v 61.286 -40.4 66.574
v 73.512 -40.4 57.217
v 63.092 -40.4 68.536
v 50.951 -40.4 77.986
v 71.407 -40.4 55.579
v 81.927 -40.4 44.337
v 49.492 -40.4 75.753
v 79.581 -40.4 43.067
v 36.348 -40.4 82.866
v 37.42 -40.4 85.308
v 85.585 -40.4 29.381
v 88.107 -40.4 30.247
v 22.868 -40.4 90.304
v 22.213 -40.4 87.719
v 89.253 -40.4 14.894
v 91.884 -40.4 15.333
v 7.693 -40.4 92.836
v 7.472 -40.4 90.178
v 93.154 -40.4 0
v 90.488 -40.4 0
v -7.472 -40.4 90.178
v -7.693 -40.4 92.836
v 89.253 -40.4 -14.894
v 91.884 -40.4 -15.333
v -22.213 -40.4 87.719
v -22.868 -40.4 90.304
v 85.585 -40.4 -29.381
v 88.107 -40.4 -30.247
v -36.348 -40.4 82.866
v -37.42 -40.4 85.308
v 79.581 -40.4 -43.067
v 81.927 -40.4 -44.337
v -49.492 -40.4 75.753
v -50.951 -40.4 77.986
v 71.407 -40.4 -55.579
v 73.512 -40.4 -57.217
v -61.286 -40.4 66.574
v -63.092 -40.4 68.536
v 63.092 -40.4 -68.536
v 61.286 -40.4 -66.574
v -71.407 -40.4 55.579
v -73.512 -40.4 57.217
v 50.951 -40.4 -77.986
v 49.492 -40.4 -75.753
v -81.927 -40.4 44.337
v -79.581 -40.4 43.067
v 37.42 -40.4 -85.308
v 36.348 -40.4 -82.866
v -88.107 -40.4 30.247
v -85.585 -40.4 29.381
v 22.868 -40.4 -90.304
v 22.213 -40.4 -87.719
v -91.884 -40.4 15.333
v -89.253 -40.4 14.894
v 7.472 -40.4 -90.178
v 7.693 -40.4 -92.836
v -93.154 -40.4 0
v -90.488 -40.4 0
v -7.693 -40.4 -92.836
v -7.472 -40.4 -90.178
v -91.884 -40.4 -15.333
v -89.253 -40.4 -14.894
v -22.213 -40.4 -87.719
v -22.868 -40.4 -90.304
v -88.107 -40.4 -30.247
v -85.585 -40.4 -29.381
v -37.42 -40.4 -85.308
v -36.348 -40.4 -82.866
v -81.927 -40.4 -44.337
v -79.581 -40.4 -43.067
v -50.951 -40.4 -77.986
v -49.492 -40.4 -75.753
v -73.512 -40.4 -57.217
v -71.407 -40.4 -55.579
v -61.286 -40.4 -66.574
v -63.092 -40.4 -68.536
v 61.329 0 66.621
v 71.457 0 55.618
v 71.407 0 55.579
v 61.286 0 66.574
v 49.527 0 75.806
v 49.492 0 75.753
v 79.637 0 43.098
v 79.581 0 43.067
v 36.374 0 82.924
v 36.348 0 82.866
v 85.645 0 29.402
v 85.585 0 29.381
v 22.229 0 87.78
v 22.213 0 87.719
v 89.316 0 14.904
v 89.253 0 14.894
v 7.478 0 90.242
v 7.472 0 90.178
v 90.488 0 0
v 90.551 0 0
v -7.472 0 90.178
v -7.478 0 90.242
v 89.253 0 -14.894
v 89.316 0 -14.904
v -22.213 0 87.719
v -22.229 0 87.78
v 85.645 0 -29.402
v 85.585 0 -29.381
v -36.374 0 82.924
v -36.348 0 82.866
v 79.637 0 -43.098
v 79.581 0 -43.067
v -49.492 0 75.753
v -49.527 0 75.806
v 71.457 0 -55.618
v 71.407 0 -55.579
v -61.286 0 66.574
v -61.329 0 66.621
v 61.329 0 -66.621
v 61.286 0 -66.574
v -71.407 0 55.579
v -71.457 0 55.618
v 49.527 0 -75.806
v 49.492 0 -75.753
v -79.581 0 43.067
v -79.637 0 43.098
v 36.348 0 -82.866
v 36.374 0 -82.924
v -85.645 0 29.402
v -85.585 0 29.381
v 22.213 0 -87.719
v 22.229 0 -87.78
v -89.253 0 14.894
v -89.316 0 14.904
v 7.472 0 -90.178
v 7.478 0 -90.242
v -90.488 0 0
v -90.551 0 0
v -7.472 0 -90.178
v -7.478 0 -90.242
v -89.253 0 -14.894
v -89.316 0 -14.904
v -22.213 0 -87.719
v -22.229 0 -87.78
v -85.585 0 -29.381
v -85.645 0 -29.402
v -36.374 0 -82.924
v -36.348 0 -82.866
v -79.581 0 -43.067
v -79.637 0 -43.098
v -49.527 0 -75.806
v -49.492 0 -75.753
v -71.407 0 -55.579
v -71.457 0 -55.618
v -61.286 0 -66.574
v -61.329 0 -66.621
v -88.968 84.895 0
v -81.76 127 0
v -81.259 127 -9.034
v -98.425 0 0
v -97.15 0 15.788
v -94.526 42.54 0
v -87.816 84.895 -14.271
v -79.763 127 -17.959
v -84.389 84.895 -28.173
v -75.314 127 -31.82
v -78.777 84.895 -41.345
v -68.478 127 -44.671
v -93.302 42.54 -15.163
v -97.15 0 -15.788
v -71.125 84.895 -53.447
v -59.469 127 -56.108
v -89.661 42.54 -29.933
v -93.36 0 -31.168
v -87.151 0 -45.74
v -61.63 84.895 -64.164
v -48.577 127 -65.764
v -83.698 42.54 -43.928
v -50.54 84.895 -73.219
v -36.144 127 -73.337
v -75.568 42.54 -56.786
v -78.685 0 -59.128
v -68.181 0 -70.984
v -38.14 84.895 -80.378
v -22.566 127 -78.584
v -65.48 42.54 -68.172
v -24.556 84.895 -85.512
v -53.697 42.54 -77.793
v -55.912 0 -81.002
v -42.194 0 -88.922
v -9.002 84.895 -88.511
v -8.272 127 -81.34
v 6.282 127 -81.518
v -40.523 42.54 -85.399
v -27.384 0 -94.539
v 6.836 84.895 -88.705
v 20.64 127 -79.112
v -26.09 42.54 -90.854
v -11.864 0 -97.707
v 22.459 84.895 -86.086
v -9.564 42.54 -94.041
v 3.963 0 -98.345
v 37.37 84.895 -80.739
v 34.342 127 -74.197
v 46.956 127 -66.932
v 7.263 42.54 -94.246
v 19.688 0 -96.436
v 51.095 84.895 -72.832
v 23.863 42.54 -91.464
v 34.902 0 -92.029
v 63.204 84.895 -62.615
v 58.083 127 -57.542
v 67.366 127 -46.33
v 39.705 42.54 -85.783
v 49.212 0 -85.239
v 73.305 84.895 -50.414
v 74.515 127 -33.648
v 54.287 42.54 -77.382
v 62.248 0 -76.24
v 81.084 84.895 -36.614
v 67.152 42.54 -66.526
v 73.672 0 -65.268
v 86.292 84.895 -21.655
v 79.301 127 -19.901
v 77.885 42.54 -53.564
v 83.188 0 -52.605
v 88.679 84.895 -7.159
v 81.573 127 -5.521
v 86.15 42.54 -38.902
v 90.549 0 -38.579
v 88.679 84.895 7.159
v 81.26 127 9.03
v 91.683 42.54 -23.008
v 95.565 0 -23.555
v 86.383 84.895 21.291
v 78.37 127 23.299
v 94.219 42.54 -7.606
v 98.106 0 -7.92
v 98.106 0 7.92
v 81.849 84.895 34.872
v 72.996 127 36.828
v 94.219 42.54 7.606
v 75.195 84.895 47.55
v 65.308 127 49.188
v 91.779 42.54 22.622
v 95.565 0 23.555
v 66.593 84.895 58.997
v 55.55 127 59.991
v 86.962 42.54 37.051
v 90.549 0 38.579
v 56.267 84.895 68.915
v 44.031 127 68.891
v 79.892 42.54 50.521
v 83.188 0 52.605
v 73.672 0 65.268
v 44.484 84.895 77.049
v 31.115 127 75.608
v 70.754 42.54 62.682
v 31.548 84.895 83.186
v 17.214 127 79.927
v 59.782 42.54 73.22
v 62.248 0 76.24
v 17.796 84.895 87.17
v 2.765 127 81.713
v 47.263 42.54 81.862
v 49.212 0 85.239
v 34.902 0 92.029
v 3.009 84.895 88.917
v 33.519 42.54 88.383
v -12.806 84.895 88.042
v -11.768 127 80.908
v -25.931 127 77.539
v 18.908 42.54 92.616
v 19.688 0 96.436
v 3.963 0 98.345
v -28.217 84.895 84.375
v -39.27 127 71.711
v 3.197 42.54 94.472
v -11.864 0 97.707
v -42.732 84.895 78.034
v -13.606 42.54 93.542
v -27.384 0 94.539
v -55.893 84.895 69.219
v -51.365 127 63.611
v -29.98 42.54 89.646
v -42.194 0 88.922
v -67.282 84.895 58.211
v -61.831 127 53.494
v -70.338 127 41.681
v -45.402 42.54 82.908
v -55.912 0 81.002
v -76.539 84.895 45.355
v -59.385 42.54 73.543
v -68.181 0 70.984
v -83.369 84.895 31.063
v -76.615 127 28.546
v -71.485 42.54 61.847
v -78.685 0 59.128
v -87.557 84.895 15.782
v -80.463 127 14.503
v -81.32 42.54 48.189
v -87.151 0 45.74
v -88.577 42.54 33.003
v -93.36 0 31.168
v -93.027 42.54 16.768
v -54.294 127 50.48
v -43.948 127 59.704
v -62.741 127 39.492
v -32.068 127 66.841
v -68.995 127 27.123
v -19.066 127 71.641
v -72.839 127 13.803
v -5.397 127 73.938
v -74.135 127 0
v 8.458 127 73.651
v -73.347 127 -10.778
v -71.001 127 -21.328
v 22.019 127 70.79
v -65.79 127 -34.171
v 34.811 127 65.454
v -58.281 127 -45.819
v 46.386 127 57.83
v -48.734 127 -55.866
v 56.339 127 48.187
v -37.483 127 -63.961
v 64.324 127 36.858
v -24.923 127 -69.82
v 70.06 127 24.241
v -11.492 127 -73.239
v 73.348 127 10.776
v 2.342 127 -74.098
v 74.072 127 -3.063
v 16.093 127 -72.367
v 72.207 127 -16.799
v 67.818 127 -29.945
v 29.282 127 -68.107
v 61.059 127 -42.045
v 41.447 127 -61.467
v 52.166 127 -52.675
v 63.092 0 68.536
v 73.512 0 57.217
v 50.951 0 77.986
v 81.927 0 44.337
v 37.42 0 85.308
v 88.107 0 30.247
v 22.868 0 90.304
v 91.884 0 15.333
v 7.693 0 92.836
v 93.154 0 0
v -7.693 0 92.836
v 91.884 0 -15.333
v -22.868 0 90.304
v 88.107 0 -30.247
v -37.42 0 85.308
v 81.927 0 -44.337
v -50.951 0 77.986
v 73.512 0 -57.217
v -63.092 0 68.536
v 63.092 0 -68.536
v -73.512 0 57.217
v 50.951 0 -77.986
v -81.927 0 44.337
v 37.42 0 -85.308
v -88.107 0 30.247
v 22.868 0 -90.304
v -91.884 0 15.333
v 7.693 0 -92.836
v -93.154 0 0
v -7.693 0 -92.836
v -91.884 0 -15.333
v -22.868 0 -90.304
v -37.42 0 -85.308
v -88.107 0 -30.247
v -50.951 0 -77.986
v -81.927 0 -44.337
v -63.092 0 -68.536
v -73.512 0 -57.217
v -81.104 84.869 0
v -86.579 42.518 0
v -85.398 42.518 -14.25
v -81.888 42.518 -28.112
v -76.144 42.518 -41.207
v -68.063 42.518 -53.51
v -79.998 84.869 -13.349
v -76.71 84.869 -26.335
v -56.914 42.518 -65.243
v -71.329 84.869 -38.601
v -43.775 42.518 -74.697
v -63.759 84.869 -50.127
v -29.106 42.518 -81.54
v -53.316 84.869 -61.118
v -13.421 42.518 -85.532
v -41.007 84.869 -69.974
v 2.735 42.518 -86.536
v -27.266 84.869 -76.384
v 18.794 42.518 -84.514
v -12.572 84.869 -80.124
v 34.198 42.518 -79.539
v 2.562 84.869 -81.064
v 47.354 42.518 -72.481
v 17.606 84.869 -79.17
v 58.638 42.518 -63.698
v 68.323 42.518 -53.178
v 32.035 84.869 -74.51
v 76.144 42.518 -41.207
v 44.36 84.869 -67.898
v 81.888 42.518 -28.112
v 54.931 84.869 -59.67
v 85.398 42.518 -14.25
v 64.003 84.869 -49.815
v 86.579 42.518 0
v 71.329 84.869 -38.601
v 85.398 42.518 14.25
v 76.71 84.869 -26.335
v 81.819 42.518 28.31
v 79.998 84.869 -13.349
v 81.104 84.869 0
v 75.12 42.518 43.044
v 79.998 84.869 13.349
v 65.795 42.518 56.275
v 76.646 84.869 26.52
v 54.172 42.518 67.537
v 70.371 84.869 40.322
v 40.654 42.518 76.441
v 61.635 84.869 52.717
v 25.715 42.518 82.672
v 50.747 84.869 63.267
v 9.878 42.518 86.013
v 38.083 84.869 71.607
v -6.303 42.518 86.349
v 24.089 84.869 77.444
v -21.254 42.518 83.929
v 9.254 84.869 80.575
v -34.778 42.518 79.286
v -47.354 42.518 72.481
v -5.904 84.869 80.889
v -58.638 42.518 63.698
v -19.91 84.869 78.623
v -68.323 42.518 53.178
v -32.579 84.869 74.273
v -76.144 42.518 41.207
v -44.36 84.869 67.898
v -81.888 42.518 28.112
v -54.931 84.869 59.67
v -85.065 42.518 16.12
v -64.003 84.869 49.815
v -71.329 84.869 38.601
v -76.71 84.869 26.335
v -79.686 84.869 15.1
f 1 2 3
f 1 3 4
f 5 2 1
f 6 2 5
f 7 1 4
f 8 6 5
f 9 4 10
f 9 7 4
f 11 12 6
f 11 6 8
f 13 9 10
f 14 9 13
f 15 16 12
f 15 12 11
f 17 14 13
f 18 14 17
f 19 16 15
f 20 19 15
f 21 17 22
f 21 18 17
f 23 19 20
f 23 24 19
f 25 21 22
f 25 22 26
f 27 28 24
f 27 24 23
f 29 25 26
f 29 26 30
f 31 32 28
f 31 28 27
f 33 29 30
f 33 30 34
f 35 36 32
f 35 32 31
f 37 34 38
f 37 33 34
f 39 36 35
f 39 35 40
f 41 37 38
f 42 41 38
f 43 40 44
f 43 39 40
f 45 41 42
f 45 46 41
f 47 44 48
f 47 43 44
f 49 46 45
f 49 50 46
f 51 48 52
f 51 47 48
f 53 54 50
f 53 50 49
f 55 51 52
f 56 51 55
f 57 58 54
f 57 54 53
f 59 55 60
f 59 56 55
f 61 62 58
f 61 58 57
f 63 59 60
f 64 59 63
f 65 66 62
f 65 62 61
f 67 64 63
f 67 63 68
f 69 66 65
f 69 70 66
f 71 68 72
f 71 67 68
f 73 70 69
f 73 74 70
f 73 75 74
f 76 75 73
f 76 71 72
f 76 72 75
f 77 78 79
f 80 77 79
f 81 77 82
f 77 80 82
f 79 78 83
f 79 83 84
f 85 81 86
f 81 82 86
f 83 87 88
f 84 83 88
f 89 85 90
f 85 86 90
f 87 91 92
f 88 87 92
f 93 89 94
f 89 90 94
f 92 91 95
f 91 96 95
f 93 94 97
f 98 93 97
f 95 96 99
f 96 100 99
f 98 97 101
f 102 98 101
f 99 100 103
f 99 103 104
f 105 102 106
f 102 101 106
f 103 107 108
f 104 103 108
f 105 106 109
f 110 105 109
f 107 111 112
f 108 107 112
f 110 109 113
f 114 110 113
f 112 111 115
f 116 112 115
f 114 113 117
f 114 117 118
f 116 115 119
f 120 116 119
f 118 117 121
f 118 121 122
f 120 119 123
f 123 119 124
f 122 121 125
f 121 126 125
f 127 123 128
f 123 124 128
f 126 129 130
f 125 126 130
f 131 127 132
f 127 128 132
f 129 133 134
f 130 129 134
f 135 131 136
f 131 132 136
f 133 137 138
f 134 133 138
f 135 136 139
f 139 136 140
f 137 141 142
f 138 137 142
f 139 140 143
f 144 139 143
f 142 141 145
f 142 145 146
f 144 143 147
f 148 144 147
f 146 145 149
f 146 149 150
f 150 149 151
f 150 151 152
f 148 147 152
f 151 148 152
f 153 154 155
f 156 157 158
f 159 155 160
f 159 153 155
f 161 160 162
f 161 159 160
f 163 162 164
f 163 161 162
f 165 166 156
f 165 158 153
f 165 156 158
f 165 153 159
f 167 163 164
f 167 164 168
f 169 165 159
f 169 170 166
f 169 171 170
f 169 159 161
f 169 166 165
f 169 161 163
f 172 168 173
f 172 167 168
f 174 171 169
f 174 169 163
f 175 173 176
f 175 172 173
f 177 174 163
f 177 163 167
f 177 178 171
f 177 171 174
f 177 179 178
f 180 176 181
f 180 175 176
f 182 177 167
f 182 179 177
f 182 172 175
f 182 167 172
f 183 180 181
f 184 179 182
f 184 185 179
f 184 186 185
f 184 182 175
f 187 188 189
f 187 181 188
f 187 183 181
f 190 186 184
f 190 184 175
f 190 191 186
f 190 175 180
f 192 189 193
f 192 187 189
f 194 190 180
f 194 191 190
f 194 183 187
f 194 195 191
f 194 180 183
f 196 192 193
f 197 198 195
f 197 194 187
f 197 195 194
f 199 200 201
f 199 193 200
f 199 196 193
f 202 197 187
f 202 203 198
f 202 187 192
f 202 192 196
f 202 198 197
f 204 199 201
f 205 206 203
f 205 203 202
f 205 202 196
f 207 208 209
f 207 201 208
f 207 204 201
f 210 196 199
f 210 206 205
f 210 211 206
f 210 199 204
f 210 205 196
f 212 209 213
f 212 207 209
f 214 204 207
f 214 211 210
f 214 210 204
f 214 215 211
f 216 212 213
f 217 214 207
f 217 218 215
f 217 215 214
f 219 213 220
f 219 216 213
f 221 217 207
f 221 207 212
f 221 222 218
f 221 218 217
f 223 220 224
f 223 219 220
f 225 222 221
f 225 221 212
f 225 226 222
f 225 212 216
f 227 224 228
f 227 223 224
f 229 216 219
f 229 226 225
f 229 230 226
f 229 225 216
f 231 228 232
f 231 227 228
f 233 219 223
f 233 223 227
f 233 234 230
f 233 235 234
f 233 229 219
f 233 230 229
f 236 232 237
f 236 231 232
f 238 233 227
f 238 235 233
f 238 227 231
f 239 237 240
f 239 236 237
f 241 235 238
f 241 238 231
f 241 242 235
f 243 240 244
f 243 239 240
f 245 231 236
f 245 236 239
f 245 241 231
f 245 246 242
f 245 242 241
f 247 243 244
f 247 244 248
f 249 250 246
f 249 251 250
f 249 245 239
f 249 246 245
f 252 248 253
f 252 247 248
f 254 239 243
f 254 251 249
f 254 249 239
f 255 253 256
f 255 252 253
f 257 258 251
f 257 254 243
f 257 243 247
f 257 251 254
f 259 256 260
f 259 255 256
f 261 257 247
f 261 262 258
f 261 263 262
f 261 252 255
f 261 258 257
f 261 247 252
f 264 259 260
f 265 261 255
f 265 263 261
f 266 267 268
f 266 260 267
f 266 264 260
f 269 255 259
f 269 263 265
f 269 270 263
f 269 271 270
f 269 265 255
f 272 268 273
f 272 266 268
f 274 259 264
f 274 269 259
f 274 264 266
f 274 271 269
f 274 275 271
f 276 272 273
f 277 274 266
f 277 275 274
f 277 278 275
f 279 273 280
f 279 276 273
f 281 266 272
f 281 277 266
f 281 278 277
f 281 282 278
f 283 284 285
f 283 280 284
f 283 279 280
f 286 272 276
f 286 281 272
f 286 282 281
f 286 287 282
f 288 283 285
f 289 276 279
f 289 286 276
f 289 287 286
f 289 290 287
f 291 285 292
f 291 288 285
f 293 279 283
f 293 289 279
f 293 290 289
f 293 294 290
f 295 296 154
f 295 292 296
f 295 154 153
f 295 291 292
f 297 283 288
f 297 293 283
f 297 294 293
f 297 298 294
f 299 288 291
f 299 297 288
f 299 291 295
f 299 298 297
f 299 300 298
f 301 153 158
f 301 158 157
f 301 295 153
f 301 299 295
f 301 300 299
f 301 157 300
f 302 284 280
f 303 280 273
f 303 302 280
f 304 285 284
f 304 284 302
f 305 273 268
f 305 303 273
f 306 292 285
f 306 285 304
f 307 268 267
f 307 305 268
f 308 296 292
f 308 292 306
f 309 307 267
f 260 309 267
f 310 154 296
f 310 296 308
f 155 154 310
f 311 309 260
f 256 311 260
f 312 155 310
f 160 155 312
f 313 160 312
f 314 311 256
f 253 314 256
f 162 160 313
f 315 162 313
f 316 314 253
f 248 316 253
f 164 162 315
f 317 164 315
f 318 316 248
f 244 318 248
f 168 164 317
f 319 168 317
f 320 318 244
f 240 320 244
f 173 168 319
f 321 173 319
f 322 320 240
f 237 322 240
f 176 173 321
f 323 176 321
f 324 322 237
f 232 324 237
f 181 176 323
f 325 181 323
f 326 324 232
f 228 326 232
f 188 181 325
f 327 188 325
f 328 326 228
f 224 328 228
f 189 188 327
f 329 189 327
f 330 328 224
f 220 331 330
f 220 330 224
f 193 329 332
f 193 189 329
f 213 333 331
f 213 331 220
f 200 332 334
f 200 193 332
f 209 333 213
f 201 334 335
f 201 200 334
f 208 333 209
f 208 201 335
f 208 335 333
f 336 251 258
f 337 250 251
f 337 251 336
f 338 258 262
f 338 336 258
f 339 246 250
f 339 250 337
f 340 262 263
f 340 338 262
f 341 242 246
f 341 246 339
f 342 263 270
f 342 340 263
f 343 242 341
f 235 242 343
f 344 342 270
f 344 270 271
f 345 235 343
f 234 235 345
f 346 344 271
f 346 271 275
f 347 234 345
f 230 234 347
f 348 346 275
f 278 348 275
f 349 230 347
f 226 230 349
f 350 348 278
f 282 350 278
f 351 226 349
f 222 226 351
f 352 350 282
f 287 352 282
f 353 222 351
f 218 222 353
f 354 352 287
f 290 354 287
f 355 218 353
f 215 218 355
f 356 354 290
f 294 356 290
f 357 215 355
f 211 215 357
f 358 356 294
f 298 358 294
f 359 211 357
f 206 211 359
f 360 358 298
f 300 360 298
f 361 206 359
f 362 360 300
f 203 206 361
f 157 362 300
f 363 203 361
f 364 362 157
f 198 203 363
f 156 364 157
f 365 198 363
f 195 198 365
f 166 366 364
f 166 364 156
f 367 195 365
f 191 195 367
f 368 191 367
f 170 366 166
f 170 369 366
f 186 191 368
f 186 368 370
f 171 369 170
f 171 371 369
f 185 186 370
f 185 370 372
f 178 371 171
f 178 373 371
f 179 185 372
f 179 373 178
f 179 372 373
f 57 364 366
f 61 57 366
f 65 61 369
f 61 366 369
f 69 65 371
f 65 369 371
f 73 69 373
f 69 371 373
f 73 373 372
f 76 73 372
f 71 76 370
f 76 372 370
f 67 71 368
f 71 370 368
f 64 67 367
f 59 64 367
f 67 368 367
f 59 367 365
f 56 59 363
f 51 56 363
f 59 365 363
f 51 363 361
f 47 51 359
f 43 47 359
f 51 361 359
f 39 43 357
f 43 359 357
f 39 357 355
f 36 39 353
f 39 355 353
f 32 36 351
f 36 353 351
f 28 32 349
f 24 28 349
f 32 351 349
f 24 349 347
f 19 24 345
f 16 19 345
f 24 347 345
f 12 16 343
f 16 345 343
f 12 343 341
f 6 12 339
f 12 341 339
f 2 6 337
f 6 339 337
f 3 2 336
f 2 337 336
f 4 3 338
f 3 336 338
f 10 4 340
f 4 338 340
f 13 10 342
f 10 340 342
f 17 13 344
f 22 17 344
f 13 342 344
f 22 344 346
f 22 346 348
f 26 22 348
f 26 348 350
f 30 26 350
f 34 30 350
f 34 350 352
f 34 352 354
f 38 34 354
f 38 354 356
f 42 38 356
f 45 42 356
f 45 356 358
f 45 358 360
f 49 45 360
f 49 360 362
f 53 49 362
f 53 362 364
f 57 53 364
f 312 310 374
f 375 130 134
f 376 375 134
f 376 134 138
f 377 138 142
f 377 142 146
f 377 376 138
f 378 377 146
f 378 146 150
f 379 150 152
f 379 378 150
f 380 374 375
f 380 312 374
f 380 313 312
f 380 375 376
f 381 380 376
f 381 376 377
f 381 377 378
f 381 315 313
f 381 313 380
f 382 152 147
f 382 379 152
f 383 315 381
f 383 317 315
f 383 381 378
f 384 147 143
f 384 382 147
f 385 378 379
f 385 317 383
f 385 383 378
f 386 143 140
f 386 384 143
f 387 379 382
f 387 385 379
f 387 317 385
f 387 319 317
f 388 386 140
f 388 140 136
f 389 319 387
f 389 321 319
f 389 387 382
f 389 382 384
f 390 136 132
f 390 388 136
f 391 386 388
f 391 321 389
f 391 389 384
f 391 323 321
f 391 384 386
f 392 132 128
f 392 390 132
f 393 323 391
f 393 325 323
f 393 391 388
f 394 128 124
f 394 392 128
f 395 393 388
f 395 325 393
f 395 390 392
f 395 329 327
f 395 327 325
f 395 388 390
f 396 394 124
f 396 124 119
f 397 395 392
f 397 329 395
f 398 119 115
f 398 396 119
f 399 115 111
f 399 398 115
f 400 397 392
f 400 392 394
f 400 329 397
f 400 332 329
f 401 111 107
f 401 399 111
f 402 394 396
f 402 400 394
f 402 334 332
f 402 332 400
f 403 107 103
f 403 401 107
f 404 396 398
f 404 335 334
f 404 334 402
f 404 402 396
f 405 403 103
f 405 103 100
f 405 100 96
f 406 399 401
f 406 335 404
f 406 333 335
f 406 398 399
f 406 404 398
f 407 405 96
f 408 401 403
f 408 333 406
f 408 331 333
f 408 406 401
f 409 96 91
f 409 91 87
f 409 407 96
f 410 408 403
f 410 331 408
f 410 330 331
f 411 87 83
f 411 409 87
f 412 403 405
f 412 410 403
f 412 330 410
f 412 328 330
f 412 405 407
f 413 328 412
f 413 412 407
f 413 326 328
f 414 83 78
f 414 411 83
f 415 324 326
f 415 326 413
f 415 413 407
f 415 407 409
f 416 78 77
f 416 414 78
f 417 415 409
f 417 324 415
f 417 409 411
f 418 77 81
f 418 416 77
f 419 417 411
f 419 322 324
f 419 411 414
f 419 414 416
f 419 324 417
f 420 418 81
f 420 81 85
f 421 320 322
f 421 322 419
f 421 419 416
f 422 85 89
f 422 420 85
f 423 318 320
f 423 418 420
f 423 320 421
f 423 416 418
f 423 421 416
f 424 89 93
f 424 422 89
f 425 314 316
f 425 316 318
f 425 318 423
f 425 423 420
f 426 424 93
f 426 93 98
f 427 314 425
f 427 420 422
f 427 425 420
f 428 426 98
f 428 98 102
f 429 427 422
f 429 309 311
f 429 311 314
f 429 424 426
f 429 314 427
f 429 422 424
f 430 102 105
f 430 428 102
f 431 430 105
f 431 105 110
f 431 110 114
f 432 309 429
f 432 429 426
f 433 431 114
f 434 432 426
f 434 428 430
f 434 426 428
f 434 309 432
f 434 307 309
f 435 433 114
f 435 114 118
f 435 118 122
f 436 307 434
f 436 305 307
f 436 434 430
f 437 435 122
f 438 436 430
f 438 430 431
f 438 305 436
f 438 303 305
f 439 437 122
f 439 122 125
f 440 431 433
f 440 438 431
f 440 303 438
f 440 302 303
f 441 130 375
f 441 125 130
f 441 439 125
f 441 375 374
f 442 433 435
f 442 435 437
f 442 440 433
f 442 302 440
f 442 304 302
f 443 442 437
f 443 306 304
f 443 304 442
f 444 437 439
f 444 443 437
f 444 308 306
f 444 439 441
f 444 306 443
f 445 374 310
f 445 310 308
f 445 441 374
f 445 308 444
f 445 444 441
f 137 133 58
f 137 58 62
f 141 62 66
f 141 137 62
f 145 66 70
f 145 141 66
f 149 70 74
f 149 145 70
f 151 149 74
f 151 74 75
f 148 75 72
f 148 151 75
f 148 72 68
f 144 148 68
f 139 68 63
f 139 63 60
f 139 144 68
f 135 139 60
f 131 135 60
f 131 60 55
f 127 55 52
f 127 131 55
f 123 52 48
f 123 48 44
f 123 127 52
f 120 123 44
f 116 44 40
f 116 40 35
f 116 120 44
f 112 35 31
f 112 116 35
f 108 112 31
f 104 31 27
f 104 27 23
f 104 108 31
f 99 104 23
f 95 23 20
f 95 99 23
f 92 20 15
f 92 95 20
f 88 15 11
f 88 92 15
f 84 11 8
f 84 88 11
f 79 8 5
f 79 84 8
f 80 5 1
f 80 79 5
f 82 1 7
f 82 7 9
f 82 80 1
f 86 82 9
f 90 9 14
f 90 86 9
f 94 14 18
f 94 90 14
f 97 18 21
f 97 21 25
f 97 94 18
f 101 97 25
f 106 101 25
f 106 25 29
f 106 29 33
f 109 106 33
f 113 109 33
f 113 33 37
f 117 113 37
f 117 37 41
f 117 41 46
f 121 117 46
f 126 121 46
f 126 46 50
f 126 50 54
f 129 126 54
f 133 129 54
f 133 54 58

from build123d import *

# Parameters (mm, degrees)
SKETCH4_R           = 93.1545
SKETCH4_R_2         = 90.4875
BOSS_EXTRUDE2_DEPTH = 40.3999954
SKETCH7_R           = 317.5
CUT_EXTRUDE2_DEPTH  = 254


with BuildPart() as part:
    # Sketch2 → Revolve1 (revolve)
    with BuildSketch(Plane.XY):
        with BuildLine():
            Line((-98.425, 0), (-90.551, 0))
            ThreePointArc((-90.551, 0), (-60.43106349, 191.610647557), (0, 375.92))
            Line((0, 375.92), (0, 381))
            ThreePointArc((0, 381), (-66.494117829, 194.964417939), (-98.425, 0))
        make_face()
    revolve(axis=Axis((0, 381, 0), (0, -1, 0)))

    # Sketch4 → Boss-Extrude2 (add)
    with BuildSketch(Plane(origin=(0, 0, 0), x_dir=(-1, 0, 0), z_dir=(0, -1, 0))):
        Circle(SKETCH4_R)
        Circle(SKETCH4_R_2, mode=Mode.SUBTRACT)
    extrude(amount=BOSS_EXTRUDE2_DEPTH)

    # Sketch7 → Cut-Extrude2 (cut)
    with BuildSketch(Plane(origin=(0, 381, 0), x_dir=(1, 0, 0), z_dir=(0, 1, 0))):
        Circle(SKETCH7_R)
    extrude(amount=-CUT_EXTRUDE2_DEPTH, mode=Mode.SUBTRACT)


solid = part.part
